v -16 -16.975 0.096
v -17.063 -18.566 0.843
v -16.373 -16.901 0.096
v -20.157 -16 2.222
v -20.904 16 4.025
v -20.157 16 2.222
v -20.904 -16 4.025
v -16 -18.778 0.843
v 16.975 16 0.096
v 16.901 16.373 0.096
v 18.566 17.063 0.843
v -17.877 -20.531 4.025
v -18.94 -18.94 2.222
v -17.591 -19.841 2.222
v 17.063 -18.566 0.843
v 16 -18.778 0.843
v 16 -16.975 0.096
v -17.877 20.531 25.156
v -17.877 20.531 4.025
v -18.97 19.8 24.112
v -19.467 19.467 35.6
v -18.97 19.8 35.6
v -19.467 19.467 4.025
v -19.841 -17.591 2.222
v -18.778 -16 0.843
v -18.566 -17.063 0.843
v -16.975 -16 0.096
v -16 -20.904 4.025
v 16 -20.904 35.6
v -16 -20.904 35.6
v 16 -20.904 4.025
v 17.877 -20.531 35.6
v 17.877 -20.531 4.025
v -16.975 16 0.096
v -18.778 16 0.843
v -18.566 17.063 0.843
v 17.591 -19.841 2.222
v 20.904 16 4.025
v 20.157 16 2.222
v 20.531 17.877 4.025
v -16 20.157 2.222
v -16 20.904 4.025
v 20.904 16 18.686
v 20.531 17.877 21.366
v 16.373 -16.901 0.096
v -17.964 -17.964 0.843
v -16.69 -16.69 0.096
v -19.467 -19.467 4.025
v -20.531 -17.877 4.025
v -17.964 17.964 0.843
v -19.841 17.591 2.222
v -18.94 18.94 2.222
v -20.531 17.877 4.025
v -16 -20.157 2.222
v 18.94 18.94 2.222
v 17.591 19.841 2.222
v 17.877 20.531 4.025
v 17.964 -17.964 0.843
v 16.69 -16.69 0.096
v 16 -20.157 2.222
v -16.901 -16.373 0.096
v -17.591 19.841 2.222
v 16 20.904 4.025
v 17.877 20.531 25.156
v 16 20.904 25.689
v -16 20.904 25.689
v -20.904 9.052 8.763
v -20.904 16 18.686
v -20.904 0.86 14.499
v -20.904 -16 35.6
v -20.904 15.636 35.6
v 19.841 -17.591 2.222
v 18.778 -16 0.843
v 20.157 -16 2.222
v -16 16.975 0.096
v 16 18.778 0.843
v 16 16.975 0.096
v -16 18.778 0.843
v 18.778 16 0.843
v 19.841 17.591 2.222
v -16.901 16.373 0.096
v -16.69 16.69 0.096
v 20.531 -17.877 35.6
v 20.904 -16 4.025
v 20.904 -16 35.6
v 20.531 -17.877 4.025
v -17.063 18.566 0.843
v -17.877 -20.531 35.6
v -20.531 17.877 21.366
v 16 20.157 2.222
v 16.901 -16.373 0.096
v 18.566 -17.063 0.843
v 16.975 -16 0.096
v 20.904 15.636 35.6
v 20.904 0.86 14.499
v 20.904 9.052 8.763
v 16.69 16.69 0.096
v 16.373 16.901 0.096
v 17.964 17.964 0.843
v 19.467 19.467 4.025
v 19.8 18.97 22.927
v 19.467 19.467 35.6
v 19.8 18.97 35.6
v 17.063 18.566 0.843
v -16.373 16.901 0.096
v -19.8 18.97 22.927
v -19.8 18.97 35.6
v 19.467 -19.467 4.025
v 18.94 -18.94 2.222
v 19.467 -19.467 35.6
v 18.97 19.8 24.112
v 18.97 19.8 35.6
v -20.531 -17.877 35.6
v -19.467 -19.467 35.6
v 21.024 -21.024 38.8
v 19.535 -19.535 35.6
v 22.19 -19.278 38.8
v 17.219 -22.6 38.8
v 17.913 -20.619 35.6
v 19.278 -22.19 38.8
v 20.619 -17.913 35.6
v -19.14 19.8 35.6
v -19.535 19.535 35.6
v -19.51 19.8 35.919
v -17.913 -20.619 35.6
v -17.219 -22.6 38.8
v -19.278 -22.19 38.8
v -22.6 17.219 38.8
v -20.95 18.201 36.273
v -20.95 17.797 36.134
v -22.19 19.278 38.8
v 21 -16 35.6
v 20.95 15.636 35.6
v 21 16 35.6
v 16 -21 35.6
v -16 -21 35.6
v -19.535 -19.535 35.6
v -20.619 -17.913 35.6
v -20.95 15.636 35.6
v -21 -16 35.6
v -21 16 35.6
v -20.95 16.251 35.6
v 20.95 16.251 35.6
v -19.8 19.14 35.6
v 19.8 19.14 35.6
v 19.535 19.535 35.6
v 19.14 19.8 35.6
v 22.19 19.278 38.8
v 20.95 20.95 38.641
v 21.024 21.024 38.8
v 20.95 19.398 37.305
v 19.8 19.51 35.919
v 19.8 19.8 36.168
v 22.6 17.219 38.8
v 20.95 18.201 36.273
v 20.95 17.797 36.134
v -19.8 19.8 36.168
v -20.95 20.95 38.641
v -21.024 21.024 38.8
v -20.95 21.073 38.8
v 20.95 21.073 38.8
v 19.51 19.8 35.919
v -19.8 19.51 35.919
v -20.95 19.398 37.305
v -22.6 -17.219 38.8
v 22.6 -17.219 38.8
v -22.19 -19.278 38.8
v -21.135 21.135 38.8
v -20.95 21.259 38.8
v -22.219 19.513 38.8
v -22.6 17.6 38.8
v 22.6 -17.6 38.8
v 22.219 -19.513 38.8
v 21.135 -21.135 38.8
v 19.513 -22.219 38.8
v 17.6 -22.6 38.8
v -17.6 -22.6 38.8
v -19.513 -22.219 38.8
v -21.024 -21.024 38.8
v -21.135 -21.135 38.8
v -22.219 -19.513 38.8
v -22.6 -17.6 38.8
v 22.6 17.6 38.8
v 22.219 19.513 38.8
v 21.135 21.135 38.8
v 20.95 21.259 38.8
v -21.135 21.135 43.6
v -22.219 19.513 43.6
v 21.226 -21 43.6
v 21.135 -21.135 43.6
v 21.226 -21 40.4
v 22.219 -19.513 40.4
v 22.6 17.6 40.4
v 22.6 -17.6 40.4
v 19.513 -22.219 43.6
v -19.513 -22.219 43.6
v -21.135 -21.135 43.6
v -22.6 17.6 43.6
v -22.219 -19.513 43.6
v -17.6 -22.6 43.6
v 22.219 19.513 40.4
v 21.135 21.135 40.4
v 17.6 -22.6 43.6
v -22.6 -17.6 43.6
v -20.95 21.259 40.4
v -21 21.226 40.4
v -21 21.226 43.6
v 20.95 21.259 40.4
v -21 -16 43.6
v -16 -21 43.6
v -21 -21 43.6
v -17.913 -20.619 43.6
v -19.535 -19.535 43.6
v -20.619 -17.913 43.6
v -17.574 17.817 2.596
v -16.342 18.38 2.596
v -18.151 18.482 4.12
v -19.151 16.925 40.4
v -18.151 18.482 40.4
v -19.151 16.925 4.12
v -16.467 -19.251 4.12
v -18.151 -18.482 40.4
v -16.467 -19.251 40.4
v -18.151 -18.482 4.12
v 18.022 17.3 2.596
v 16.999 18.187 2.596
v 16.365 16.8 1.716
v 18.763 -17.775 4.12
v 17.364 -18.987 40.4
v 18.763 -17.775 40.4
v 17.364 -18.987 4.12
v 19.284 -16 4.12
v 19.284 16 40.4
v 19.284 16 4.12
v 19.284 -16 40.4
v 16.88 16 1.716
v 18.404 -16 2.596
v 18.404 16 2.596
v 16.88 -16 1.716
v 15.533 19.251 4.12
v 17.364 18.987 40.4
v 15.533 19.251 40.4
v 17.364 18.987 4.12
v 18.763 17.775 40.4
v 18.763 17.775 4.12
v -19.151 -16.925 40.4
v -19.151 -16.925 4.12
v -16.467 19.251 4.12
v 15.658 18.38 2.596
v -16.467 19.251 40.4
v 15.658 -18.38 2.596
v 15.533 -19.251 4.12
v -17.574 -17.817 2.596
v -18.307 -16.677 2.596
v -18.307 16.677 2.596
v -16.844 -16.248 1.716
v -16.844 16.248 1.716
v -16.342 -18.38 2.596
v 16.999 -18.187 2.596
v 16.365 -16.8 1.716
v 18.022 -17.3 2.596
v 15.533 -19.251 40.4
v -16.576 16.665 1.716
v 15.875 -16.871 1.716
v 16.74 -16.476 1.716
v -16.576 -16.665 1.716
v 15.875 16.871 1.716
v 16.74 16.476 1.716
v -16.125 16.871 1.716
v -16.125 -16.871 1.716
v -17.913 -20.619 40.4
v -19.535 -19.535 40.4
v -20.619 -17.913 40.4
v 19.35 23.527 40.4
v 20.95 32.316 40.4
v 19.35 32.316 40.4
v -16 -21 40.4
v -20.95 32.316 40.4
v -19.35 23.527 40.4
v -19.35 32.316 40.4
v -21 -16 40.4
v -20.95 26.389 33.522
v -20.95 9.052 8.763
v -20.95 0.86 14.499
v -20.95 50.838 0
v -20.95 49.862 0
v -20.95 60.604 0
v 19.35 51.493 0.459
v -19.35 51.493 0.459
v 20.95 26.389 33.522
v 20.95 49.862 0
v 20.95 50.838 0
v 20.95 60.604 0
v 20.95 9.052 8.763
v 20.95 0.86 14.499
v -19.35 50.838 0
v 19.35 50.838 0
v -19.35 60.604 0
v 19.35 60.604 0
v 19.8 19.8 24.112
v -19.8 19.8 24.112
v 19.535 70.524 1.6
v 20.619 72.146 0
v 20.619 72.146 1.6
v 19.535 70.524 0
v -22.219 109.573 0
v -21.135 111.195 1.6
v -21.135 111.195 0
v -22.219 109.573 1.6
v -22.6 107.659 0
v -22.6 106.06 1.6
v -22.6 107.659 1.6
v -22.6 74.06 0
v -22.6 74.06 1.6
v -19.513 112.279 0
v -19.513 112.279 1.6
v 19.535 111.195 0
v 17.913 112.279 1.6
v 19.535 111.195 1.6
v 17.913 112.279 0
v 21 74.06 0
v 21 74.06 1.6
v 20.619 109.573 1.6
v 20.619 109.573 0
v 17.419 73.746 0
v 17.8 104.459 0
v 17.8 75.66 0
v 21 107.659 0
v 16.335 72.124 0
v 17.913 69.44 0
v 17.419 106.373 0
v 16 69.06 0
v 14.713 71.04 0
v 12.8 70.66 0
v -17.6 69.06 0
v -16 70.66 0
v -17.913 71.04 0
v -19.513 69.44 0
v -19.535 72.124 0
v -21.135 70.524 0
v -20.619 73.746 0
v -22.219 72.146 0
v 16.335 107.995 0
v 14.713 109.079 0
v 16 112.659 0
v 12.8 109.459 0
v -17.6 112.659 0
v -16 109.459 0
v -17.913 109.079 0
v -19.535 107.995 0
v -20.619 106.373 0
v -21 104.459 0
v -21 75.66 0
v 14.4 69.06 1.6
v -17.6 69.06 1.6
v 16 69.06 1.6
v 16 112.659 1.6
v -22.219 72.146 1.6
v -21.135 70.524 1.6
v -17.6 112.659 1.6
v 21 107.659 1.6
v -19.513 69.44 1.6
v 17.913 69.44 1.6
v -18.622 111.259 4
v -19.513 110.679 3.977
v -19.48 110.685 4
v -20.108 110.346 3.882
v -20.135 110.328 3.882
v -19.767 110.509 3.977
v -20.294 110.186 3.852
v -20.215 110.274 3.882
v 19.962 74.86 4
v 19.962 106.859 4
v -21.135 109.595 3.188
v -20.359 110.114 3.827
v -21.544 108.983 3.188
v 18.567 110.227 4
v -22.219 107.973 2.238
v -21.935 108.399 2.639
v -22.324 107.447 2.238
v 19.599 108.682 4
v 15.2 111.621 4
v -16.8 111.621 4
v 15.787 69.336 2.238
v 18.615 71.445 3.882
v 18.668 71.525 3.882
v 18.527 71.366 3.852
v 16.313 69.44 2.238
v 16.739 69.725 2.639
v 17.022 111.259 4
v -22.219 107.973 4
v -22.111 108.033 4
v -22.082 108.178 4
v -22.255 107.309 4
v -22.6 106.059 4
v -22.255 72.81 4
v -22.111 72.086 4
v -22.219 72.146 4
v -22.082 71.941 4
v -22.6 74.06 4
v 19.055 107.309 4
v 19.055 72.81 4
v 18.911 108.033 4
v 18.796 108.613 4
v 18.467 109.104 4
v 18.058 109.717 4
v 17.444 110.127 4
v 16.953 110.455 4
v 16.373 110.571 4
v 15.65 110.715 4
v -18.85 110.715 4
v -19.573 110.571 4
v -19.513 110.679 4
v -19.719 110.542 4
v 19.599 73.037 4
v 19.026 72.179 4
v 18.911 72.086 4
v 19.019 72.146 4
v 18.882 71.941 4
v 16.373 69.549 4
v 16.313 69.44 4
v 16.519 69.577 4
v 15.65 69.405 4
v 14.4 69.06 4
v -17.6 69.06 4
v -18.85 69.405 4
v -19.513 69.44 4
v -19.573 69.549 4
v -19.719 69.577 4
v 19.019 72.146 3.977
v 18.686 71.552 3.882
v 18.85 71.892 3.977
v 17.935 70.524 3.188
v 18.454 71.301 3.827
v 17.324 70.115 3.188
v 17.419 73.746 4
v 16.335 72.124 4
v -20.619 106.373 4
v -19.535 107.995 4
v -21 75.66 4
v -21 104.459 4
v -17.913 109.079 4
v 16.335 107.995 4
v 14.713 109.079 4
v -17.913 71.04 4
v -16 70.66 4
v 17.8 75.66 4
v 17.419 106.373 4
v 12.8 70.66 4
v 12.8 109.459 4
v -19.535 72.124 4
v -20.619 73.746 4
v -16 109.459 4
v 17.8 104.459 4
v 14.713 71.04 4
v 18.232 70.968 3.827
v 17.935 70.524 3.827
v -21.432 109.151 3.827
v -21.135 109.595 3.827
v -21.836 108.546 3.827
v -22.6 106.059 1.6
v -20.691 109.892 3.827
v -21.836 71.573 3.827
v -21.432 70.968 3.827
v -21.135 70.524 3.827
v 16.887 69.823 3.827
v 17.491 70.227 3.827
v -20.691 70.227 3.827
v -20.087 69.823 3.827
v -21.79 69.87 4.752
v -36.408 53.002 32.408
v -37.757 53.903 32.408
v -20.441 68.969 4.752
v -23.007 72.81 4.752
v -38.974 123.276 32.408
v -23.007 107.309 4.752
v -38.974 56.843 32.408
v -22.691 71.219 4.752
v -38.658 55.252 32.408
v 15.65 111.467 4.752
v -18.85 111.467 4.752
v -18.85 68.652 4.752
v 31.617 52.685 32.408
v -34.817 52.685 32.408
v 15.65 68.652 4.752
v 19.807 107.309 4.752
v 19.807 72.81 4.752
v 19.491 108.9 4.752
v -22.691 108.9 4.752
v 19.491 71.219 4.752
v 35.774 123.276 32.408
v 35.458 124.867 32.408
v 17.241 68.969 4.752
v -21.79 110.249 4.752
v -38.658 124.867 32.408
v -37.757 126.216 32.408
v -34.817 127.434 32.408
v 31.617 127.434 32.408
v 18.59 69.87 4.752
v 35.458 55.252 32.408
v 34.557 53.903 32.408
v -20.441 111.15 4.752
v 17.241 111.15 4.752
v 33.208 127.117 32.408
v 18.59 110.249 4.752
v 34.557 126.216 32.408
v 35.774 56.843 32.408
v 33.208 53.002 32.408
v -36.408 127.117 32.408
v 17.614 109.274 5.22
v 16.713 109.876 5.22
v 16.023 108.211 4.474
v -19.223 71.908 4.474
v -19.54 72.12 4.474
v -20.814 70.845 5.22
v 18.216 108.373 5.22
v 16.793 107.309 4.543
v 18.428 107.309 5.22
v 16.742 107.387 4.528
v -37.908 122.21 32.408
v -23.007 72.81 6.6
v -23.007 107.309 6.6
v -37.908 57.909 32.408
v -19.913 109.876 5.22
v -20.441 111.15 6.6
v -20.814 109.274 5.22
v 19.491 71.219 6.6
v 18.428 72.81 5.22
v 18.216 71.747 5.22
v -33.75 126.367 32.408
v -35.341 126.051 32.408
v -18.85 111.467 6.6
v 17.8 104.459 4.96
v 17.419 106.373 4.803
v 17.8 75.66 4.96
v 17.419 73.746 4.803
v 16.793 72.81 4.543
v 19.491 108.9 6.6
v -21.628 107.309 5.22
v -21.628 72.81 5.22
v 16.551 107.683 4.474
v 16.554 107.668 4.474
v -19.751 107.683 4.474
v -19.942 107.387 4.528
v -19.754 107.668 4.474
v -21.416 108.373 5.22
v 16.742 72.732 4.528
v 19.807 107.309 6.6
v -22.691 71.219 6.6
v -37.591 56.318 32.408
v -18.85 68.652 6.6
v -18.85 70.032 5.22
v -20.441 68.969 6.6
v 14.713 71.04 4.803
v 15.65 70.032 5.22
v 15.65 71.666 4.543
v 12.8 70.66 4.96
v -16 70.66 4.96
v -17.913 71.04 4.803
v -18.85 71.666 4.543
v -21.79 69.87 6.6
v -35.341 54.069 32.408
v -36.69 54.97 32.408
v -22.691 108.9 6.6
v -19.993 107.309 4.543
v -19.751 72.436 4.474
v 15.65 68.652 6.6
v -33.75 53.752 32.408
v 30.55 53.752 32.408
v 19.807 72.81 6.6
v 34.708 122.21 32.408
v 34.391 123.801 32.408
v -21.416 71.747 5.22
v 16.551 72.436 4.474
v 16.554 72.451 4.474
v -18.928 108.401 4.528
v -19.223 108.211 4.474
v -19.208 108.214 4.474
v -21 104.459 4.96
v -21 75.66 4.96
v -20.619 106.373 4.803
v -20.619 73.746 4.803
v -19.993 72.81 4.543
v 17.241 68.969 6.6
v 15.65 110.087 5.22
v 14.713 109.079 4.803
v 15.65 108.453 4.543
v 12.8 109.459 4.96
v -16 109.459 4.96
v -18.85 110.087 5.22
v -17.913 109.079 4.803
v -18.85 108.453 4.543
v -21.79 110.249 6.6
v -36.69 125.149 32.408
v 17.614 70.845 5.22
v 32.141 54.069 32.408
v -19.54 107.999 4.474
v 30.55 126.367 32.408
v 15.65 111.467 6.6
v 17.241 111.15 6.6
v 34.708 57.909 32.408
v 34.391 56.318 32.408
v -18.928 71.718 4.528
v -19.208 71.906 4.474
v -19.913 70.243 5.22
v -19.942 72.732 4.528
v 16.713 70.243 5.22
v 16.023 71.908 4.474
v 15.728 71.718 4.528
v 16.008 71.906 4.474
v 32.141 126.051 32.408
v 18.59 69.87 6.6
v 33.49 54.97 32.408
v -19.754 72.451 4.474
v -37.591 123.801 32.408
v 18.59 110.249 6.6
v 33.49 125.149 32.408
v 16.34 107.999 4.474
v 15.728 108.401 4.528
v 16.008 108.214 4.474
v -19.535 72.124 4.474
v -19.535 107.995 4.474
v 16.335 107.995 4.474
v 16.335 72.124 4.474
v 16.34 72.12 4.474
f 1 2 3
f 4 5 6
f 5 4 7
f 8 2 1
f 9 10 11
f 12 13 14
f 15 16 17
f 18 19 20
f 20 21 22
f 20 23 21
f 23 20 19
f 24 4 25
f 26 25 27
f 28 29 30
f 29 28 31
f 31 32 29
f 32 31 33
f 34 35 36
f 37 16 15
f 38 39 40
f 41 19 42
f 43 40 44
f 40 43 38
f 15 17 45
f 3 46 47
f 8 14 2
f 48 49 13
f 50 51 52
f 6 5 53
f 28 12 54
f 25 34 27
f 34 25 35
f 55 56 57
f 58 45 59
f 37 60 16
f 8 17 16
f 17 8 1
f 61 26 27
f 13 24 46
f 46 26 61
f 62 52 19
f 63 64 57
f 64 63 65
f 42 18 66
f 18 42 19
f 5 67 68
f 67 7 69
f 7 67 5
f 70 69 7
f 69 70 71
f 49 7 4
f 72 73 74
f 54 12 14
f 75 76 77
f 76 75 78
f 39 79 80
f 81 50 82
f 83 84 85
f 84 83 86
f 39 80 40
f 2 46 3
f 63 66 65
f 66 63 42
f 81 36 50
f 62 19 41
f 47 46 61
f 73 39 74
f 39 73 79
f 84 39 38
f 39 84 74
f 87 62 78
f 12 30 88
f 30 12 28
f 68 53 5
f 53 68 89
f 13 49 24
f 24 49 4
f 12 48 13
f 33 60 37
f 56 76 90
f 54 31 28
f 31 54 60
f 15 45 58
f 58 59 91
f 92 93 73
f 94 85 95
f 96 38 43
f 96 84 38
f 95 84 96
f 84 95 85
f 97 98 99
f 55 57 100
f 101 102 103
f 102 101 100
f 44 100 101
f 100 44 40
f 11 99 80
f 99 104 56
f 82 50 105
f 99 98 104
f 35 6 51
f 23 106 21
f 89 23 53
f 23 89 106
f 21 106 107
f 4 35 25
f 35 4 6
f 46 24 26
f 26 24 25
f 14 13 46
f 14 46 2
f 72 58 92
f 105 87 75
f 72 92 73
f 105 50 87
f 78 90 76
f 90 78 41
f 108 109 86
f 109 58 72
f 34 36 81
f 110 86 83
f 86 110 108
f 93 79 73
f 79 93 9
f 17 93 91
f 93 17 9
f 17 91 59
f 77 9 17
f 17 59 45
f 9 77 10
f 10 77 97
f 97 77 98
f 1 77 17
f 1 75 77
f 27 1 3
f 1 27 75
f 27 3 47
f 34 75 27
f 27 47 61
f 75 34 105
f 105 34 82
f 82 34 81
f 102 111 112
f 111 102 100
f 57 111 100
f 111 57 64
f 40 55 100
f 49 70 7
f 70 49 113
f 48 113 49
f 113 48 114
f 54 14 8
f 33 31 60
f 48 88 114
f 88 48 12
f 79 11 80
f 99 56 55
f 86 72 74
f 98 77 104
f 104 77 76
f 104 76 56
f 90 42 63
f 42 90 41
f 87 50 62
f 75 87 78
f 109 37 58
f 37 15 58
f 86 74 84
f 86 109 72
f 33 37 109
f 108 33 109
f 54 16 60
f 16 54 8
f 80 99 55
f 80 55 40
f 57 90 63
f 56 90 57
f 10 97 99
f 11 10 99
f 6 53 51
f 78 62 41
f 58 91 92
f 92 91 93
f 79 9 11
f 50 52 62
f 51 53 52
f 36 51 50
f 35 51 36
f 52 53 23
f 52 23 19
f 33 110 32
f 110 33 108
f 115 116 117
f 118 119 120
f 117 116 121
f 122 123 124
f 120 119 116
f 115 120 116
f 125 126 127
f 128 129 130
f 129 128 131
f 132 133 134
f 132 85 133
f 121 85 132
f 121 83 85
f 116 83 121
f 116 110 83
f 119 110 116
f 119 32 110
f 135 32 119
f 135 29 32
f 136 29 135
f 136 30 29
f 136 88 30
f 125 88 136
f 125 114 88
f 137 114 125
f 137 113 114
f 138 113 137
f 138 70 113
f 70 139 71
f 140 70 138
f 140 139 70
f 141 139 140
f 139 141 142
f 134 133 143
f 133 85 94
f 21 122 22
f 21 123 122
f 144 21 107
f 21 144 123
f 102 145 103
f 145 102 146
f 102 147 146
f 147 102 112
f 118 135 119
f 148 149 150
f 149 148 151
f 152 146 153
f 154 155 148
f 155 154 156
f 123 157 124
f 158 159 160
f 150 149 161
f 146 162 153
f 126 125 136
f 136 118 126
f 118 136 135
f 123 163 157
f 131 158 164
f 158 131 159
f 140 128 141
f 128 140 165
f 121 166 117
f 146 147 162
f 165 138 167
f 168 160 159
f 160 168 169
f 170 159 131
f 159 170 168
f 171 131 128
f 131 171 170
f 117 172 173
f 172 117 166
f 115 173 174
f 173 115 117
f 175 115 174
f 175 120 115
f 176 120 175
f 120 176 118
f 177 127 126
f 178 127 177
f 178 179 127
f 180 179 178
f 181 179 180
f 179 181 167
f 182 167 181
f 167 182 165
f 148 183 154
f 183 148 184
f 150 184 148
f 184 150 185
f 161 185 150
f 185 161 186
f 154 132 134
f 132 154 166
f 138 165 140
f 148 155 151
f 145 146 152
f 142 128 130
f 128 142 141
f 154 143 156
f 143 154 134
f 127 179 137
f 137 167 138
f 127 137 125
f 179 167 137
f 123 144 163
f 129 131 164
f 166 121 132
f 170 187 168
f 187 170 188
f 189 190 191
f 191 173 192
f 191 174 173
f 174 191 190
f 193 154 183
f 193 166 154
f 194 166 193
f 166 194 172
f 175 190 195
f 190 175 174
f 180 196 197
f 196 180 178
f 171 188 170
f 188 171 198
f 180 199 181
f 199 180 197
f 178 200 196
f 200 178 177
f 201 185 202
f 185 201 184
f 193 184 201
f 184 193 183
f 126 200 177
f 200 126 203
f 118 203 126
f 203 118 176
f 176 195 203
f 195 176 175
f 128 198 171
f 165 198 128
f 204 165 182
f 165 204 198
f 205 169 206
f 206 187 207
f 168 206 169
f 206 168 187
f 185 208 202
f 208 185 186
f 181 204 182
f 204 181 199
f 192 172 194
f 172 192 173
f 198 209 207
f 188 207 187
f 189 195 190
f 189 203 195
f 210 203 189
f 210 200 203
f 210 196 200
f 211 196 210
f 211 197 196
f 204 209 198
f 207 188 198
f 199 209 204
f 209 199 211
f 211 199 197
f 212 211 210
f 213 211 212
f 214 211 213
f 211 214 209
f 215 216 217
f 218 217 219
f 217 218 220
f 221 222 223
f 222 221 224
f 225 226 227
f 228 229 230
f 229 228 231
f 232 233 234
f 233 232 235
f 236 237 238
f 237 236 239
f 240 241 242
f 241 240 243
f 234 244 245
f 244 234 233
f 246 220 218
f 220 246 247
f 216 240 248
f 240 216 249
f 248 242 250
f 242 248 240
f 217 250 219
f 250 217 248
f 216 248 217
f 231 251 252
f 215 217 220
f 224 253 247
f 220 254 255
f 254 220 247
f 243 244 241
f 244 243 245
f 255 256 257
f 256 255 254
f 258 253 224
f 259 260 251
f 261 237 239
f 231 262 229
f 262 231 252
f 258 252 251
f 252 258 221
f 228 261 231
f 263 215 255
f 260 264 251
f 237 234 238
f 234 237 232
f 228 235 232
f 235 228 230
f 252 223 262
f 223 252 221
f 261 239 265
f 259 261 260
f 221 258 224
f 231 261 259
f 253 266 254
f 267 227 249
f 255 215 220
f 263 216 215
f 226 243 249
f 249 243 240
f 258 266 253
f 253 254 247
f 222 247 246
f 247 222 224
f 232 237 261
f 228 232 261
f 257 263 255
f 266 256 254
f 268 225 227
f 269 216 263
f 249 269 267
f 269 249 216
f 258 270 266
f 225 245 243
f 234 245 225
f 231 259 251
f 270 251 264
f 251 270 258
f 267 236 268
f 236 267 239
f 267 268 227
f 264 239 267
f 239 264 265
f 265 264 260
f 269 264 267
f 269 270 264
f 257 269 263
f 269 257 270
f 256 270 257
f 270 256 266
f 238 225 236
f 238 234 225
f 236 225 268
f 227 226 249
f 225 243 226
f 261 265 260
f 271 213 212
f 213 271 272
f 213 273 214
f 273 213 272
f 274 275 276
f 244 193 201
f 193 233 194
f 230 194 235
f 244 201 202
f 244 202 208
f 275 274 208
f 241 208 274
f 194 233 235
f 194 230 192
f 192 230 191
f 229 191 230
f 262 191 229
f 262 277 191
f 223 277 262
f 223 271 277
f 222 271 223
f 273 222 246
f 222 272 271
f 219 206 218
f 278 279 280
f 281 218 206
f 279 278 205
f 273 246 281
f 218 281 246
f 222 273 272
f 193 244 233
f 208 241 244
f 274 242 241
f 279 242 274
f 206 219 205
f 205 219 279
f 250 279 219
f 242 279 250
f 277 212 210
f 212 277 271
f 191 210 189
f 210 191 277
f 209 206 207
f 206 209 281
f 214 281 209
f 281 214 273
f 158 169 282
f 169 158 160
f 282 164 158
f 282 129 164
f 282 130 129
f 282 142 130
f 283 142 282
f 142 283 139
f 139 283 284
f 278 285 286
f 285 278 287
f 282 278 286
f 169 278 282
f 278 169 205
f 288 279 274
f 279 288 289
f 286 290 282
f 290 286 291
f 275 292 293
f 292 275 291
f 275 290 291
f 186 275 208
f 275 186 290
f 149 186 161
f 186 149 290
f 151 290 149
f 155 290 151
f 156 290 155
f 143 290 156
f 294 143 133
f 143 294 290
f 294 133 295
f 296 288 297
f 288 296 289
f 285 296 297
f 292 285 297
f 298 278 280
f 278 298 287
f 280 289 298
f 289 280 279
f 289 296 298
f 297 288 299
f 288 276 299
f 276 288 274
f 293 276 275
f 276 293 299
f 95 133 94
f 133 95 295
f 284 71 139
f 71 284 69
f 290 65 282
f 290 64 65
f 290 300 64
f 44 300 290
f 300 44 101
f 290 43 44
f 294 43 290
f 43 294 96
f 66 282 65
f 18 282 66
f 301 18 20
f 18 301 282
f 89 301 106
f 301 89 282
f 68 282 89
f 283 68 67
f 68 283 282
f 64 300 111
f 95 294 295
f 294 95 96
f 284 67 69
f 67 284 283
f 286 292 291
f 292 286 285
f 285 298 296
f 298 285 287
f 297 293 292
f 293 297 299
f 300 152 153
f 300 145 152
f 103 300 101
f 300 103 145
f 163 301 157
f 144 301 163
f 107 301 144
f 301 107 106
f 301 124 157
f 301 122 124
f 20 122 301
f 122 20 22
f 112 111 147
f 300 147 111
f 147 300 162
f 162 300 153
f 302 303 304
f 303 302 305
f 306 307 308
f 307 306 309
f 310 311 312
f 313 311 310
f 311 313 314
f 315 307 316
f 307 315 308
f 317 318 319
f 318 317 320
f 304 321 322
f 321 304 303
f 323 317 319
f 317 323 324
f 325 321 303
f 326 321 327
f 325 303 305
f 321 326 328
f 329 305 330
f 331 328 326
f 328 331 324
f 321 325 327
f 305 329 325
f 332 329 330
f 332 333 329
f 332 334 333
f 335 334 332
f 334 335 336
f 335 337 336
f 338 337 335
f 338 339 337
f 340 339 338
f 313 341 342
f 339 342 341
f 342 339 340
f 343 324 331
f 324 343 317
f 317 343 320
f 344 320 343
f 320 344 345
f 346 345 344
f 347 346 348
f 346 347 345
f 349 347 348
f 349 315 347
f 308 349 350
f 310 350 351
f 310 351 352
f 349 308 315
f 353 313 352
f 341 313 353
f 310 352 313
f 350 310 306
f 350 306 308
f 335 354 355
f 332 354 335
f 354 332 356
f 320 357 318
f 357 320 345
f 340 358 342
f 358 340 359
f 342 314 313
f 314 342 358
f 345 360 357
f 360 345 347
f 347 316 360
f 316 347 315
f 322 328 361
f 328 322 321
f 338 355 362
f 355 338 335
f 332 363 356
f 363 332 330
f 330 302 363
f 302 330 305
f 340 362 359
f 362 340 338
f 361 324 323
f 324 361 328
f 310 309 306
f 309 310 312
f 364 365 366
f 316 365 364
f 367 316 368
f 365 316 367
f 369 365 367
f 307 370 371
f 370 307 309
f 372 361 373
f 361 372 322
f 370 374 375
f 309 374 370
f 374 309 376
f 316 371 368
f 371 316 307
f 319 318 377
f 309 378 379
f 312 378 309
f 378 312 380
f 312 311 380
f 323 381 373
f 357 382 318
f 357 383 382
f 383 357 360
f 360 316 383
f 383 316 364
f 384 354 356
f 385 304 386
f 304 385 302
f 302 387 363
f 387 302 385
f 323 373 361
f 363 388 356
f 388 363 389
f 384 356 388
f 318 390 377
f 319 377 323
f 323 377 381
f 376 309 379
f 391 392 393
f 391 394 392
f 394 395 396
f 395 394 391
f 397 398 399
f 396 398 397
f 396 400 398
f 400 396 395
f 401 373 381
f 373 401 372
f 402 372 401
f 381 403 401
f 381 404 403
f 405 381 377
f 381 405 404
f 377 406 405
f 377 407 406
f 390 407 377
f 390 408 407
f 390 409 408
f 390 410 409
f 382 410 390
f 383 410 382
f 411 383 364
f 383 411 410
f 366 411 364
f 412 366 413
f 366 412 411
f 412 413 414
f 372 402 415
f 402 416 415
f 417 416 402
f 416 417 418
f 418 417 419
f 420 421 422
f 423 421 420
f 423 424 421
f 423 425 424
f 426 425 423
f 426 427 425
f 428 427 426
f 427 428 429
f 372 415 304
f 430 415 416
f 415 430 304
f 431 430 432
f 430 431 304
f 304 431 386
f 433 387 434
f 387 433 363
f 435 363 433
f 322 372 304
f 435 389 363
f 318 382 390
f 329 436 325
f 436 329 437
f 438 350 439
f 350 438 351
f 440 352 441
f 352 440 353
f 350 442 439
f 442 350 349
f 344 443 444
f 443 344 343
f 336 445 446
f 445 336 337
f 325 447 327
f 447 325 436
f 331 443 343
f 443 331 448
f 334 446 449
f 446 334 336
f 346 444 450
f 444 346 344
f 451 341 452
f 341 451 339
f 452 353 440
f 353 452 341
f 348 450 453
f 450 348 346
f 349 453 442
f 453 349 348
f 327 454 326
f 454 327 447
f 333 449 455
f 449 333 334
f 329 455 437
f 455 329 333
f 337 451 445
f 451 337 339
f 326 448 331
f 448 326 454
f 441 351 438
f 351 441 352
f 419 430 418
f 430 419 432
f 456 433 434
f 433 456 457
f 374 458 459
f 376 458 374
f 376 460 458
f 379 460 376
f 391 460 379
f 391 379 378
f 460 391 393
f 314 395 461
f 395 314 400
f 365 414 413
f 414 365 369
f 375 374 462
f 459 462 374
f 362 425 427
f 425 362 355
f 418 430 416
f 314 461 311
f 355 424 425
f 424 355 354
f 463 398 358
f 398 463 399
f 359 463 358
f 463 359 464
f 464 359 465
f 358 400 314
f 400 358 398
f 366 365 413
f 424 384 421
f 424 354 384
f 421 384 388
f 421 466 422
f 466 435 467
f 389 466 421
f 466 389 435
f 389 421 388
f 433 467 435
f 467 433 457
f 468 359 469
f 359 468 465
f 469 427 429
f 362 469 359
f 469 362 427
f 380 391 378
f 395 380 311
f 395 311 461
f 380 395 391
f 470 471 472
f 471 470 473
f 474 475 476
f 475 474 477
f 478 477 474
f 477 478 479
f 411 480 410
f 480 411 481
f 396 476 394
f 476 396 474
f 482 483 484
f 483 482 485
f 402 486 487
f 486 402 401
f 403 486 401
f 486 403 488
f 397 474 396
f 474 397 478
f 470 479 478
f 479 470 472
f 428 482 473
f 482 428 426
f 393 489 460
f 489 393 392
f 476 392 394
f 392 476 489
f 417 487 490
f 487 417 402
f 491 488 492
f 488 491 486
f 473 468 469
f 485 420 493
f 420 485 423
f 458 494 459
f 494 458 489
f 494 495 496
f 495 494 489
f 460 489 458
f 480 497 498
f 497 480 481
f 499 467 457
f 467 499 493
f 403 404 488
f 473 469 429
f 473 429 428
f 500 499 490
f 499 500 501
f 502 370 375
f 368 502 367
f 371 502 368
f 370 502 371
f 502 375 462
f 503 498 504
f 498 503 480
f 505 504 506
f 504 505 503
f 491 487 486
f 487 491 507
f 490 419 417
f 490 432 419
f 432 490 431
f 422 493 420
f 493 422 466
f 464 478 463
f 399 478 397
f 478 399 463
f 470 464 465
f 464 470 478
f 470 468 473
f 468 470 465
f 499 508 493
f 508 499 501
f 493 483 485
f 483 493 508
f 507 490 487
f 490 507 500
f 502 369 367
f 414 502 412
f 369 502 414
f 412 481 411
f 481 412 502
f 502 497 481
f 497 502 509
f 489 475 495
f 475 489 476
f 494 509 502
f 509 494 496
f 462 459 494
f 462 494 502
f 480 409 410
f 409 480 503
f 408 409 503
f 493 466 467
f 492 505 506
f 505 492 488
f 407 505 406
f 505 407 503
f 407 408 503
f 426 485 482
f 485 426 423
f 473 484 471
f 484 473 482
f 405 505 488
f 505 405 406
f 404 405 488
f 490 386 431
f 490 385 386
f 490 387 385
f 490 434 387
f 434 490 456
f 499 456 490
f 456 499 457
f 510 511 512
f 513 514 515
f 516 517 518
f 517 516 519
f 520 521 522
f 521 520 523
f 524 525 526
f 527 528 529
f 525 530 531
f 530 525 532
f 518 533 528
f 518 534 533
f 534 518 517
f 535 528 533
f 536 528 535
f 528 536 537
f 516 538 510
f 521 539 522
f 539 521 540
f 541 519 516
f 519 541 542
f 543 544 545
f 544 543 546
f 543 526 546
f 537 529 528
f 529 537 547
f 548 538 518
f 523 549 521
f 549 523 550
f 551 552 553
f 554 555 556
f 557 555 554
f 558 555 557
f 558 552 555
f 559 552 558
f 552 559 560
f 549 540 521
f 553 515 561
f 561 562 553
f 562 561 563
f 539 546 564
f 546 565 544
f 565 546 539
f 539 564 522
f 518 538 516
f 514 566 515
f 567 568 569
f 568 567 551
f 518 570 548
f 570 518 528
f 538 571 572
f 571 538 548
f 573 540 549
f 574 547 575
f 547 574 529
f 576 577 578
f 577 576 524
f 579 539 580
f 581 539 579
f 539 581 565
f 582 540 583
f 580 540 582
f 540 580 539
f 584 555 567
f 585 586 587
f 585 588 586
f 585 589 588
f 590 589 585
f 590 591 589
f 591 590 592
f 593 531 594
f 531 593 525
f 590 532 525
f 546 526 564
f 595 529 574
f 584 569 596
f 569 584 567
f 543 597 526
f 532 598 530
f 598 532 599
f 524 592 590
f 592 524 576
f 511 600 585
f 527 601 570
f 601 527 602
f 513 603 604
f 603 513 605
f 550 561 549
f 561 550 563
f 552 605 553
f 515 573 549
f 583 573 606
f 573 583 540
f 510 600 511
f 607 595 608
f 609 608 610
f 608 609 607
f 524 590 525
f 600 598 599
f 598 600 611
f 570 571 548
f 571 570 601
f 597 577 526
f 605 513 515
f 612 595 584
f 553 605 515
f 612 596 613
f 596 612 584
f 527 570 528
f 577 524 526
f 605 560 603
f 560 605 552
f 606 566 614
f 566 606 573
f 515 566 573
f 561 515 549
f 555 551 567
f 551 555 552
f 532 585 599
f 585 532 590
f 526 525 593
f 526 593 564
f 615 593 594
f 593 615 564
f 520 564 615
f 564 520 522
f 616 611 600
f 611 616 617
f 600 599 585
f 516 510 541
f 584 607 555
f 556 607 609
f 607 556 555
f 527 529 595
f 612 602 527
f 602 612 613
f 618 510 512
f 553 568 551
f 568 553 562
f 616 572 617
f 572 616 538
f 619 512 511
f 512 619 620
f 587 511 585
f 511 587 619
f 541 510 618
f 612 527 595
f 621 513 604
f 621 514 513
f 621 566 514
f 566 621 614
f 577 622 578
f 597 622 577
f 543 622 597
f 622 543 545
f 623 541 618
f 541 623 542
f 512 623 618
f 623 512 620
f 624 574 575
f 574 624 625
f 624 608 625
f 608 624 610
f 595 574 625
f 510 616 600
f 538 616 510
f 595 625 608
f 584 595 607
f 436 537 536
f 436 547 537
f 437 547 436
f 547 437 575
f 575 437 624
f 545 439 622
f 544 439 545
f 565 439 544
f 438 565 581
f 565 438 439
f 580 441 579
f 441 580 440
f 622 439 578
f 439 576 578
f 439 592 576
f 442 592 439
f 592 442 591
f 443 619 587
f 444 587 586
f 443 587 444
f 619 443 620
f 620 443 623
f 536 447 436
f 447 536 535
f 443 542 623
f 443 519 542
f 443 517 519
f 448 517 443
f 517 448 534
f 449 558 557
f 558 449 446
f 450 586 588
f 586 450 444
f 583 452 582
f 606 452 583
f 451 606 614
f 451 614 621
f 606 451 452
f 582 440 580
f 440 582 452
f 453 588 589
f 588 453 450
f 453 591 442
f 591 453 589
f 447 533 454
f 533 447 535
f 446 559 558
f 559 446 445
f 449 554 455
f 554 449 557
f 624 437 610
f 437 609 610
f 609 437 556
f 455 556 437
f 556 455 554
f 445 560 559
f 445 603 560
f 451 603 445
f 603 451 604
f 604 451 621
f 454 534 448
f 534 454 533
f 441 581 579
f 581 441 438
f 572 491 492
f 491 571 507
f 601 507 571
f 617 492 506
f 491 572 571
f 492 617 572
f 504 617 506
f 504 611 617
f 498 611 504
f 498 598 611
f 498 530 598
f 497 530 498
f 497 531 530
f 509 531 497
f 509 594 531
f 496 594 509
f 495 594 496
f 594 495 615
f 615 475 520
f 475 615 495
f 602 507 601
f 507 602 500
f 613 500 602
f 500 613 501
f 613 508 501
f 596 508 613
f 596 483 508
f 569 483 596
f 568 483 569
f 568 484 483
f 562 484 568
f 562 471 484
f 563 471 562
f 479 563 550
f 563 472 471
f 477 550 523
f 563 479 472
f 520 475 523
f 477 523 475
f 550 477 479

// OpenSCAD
// -*- mode: SCAD ; c-file-style: "ellemtel" ; coding: utf-8 -*-
//
// Tea portioner
//
// Copyright 2017 Roland Sieker <ospalh@gmail.com>
// Licence: CC-BY-SA 4.0
// Using material (or inspirations) by
// Soren_Furbo (https://www.thingiverse.com/thing:43899/)
//

// How many cubic centimetres (ml) for one portion
volume = 55;  // [3:0.1:250]

// Don't
use_american_customary_units = 0;  // [1:Yes please. What's a meter?, 0:Of course not! Use SI units.]

module end_customizer()
{
   // This is a dummy module so stop users messing with the values below.
}

// TODO: labels
// TODO 2: Braile labels
// label_style = 1; [0:No label, 1:Raised Text, 2:Colored Text, 3:Braile];


min_funnel_top_width = 66.66667;

// Define values for $fa and $fs (or $fn) to get smoother corners.
// N.B.: Rendering of the funnel gets quite slow for small $fs and $fa values.
// $fa = 5;
// $fs = 0.5;


// This avoids odd edges caused by rounding errors. Use a smaller value
// here when you switched to smoother above.
odd_offset = 0.1;


// Should be a multiple of your nozzle diameter
wall_thickness = 1.6; // [1.2, 1.5, 1.6, 1.8]



// pi is still wrong. Even if we use the area of a circle below. Use tau.
tau = 2 * PI;

// Curvature of sides (Sphere radius)
roundness = 5;
inner_radius = roundness-wall_thickness;

chute_angle = 55;  // Degrees
funnel_angle = 60;

v_cmm = volume * 1000;

// Crazy math to get the volume with the rounding right Basically we
// have V = l^3 - lost_volume, with lost volume = the fillets in the
// edges and corners, 1/2 (cube - sphere), and a bit, depending on l,
// (square rod - cylinder), with no l^2 term.  Transformed to 0 = l^3 +
// al + b, plugged into Wolfram Alpha, put in here.
a = -8*(4-tau/2)*inner_radius*inner_radius;
b = -v_cmm +
      ((4-tau/3) -12 * (4 - tau/2)) * inner_radius*inner_radius*inner_radius;
// echo(a);
// echo(b);
// The solution of x^3+ax+b=0, accordinrg to Wolfram alpha
cube_root_bit = pow(sqrt(3) * sqrt(4*a*a*a + 27*b*b) - 9*b, 1/3);
inner_box_dimension = cube_root_bit / (pow(2, 1/3) * pow(3, 2/3)) -
   pow(2/3, 1/3) * a / cube_root_bit;
// echo(inner_box_dimension);
// echo(pow(v_cmm,1/3));
// Quick tests showed reasonable values, so i'll keep this version
// until somebody spots an error.

// End crazy math.

some_distance = 1.95 * inner_box_dimension + 10 * wall_thickness;


if (use_american_customary_units)
{
   how_rude();
}
else
{
   measure();
   chute();

   translate([0,some_distance,0])
   {
      rotate(180)
      {
         funnel();
      }
   }
}

if (false)
{
   // Demo. Check that the funnel fits
   translate(
      [wall_thickness, wall_thickness, inner_box_dimension + wall_thickness])
   {
      rotate(180)
      {
         funnel();
      }
   }

}

module how_rude()
{
   linear_extrude(height = 0.5) {
      text(text="Please visit", size=5);
      translate([0,-5,0])
      {
         text(text="metric4us.com", size=5);
      }
   }
}

// Length of the inner cube
icl_xy = inner_box_dimension - 2 * inner_radius;
// Measure shell dimension
icl_z = inner_box_dimension - inner_radius;
msd = inner_box_dimension + 2*wall_thickness;


module measure()
{
   // The precisely shaped box

   icl_z_plus =  icl_z + 2*wall_thickness;
   difference()
   {
      union()
      {
         translate([0,0,icl_z_plus/2+roundness])
         {
            difference()
            {
               union()
               {
                  minkowski()
                  {
                     // This is the outer shell
                     cube([icl_xy, icl_xy, icl_z_plus], center=true);
                     sphere(roundness);
                  }
                  // The thicker walls at the top
                  delta_x = (inner_box_dimension +4*wall_thickness)/
                     (inner_box_dimension + 2*wall_thickness);
                  translate([0,0,icl_z/2-4*wall_thickness])
                  {
                     linear_extrude(height=2*wall_thickness,scale=delta_x)
                     {
                        offset(r=roundness)
                        {
                           square([icl_xy,icl_xy],center=true);
                        }
                     }
                  }
                  translate([0,0,icl_z/2-2*wall_thickness])
                  {
                     linear_extrude(height=3*wall_thickness)
                     {
                        offset(r=roundness)
                        {
                           square([icl_xy+2*wall_thickness,icl_xy+2*wall_thickness],center=true);
                        }
                     }
                  }
               }
               minkowski()
               {
                  // This is the main hollow shell
                  cube([icl_xy, icl_xy, icl_z_plus], center=true);
                  sphere(inner_radius);
               }
               // Cut off the top. A big enough cube. important is the
               // lower face height.
               translate([-msd/2,-msd/2,icl_z_plus/2])
               {
                  cube([msd,msd,2*roundness]);
               }
            }
         }
      } // The measuring cup, with thick walls
      // Cutting out space where to put on the funnel. (No rails, just
      // lay it on top.)
      xyl_extra = 5*wall_thickness;
      xyl = inner_box_dimension+2*wall_thickness-2*roundness;
      translate([xyl_extra/2, xyl_extra/2, wall_thickness+inner_box_dimension])
      {
         linear_extrude(2.5*wall_thickness)
         {
            offset(roundness)
            {
               square([xyl + xyl_extra, xyl + xyl_extra],center=true);
            }
         }
      }
   }


}

module chute()
{
   // The length were done by hand, rather than
   // calculated. looks good, is good enough.
   w = inner_box_dimension + 2*wall_thickness - odd_offset;
   h = inner_box_dimension + wall_thickness;
   l = h / sin(chute_angle);
   p = l * cos(chute_angle);
   o = w/2 + p/2 + wall_thickness;
   difference()
   {
      union()
      {
         rotate([0,0,180])
         {
            translate([0,-o, h/2])
            {
               rotate(a=[chute_angle, 0, 0])
               {
                  cube([w, l, wall_thickness], center=true);
                  translate([w/2-wall_thickness/2,0,2.5*wall_thickness])
                  {
                     cube([wall_thickness, 2*l, 5*wall_thickness], center=true);
                  }
                  translate([-w/2+wall_thickness/2,0,2.5*wall_thickness])
                  {
                     cube([wall_thickness, 2*l, 5*wall_thickness], center=true);
                  }
               }
            }
            // Better connection between chute and measure
            difference()
            {
               translate([0,-w/2,
                          inner_box_dimension - inner_radius + roundness])
               {
                  rotate(a=[-chute_angle, 0, 0])
                  {
                     translate([-w/2, -wall_thickness, -2 * roundness + 1 * wall_thickness])
                     {
                        cube([w, 0.85*h, 2 * roundness]);
                     }
                  }
               }
               translate([0,-o, h/2])
               {
                  rotate(a=[chute_angle, 0, 0])
                  {
                     translate([0, 3*wall_thickness, 5*wall_thickness])
                     {
                        cube([w-odd_offset, l, 10*wall_thickness], center=true);
                     }
                  }
               }
               // I wanted to round the connection off. Too much work
               // to position the cylinder to do it.
               // translate([0,0,0])
               // {
               //    rotate(a=[0,90,0])
               //    {
               //       translate([0,0,-w/2])
               //       {
               //          cylinder(r=inner_radius, h=w);
               //       }
               //    }
               // }
            }
         }
      }
      // Honking big boxes to cut off too large stuff
      translate([0,0,-10*inner_box_dimension])
      {
         cube(20*inner_box_dimension,center=true);
      }
      translate(
         [0,0,10*inner_box_dimension + inner_box_dimension -
          inner_radius +roundness])
      {
         cube(20*inner_box_dimension,center=true);
      }
      cube([inner_box_dimension+wall_thickness/2,inner_box_dimension+wall_thickness/2,3*inner_box_dimension],center=true);
   }
}

module funnel()
{
   // First the base
//   xo = inner_box_dimension+2*wall_thickness-2*roundness-2*slider_tolerance;
   xyo = inner_box_dimension+3*wall_thickness-2*roundness;

//   xm = inner_box_dimension                 -2*roundness-2*slider_tolerance;
   xym = inner_box_dimension+2*wall_thickness-2*roundness;

//   xi = inner_box_dimension-2*wall_thickness-2*roundness-2*slider_tolerance;
   xyi = inner_box_dimension+0*  wall_thickness-2*roundness;
   difference()
    {
       translate([0.5*wall_thickness, 0.5*wall_thickness, 0])
       {
          union()
          {
             linear_extrude(wall_thickness)
             {
                offset(roundness)
                {
                   square([xyo,xyo],center=true);
                }
             }
             // Half of this is hidden in the bit below. This covers some edges
             translate([0,0, wall_thickness])
             {

                linear_extrude(height=1.5*wall_thickness, scale=xym/xyo)
                {
                   offset(roundness)
                   {
                      square([xyo,xyo],center=true);
                   }
                }
             }
          }
       }
       translate([wall_thickness, wall_thickness, -0.5*wall_thickness])
       {
          linear_extrude(4*wall_thickness)
          {
             offset(roundness)
             {
                square([xyi, xyi],center=true);
             }
          }
       }

    }

   difference()
    {
       translate([wall_thickness, wall_thickness, wall_thickness])
       {
          linear_extrude(1.5*wall_thickness)
          {
             offset(roundness)
             {
                square([xym, xym],center=true);
             }
          }
       }
       translate([wall_thickness, wall_thickness, -0.5*wall_thickness])
       {
          linear_extrude(4*wall_thickness)
          {
             offset(roundness)
             {
                square([xyi, xyi],center=true);
             }
          }
       }
    }
   // funnel_angle is typically 60 degrees, tan(60degrees) == sqrt(3)
   funnel_offset = wall_thickness / sin(funnel_angle);
   funnel_z_offset = roundness * sin(funnel_angle);
//   xf = xm + roundness * cos(funnel_angle);
   xyfb = xym + roundness * cos(funnel_angle);
   xyft = max(xyfb, min_funnel_top_width/2);
   funnel_height = (xyft - xyfb/2) * tan(funnel_angle);
   translate([wall_thickness, wall_thickness,
              2*wall_thickness + funnel_z_offset])
   {
       difference()
       {
           hull()
           {
               translate([xyfb/2, xyfb/2, 0])
               {
                   sphere(roundness);
               }
               translate([-xyfb/2, xyfb/2, 0])
               {
                   sphere(roundness);
               }
               translate([xyfb/2, -xyfb/2, 0])
               {
                   sphere(roundness);
               }
               translate([-xyfb/2, -xyfb/2, 0])
               {
                   sphere(roundness);
               }
               translate([0,0,funnel_height])
               {
                   translate([xyft, xyft, 0])
                   {
                       sphere(roundness);
                   }
                   translate([-xyft, xyft, 0])
                   {
                       sphere(roundness);
                   }
                   translate([xyft, -xyft, 0])
                   {
                       sphere(roundness);
                   }
                   translate([-xyft, -xyft, 0])
                   {
                       sphere(roundness);
                   }
               }
           }
           translate([0,0,funnel_offset])
           {
               hull()
               {
                   translate([xyfb/2, xyfb/2, 0])
                   {
                       sphere(roundness);
                   }
                   translate([-xyfb/2, xyfb/2, 0])
                   {
                       sphere(roundness);
                   }
                   translate([xyfb/2, -xyfb/2, 0])
                   {
                       sphere(roundness);
                   }
                   translate([-xyfb/2, -xyfb/2, 0])
                   {
                       sphere(roundness);
                   }
                   translate([0,0,funnel_height])
                   {
                       translate([xyft, xyft, 0])
                       {
                           sphere(roundness);
                       }
                       translate([-xyft, xyft, 0])
                       {
                           sphere(roundness);
                       }
                       translate([xyft, -xyft, 0])
                       {
                           sphere(roundness);
                       }
                       translate([-xyft, -xyft, 0])
                       {
                           sphere(roundness);
                       }
                   }
               }
           }
           translate([0,0,-2*roundness])
           {
               linear_extrude(4*roundness)
               {
                   offset(roundness)
                   {
                       square([xyi, xyi],center=true);
                   }
               }
           }
           translate([0,0,funnel_height-roundness])
           {
               linear_extrude(2*roundness)
               {
                   offset(roundness)
                   {
                       square([3*xyfb, 3*xyfb],center=true);
                   }
               }
           }

       }
   }
}
